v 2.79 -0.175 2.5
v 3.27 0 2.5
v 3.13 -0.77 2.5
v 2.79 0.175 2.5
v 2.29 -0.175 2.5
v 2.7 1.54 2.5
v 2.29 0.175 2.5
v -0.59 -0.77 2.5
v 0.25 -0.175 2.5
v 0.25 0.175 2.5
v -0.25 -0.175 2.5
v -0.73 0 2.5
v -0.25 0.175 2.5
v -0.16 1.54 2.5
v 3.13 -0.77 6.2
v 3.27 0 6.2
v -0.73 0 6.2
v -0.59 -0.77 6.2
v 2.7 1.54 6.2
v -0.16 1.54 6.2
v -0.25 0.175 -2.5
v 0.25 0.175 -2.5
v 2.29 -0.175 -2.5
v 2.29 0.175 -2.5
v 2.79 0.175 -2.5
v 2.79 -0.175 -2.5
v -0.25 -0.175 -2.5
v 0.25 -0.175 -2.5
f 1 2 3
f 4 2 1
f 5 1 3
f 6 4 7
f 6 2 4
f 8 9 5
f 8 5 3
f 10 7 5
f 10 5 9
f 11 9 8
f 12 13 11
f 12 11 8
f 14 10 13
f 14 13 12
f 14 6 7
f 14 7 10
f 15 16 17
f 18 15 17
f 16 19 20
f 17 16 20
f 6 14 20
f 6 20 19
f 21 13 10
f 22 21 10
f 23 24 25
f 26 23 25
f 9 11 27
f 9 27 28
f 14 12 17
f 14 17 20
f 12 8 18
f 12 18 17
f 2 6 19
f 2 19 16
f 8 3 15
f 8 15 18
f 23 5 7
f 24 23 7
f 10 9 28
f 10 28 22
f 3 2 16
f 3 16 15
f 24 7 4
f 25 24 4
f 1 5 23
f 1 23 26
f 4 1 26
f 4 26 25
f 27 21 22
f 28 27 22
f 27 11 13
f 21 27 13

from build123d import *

# Parameters (mm, degrees)
PAD_DEPTH    = 3.7
SKETCH001_W  = 0.5
SKETCH001_H  = 0.35
PAD001_DEPTH = 5


with BuildPart() as pad:
    # Sketch → Pad (new body)
    with BuildSketch(Plane.XY.offset(2.5)):
        Polygon((-0.16, 1.54), (2.7, 1.54), (3.27, 0), (3.13, -0.77), (-0.59, -0.77), (-0.73, 0), align=None)
    extrude(amount=PAD_DEPTH)


with BuildPart() as pad001_mp_cp:
    # Sketch001 → Pad001 (new body)
    with BuildSketch(Plane.XY.offset(2.5)):
        Rectangle(SKETCH001_W, SKETCH001_H)
        with Locations((2.54, 0)):
            Rectangle(SKETCH001_W, SKETCH001_H)
    extrude(amount=-PAD001_DEPTH)

    # Pad001_mp_cp: union Pad
    add(pad.part)


solid = pad001_mp_cp.part
